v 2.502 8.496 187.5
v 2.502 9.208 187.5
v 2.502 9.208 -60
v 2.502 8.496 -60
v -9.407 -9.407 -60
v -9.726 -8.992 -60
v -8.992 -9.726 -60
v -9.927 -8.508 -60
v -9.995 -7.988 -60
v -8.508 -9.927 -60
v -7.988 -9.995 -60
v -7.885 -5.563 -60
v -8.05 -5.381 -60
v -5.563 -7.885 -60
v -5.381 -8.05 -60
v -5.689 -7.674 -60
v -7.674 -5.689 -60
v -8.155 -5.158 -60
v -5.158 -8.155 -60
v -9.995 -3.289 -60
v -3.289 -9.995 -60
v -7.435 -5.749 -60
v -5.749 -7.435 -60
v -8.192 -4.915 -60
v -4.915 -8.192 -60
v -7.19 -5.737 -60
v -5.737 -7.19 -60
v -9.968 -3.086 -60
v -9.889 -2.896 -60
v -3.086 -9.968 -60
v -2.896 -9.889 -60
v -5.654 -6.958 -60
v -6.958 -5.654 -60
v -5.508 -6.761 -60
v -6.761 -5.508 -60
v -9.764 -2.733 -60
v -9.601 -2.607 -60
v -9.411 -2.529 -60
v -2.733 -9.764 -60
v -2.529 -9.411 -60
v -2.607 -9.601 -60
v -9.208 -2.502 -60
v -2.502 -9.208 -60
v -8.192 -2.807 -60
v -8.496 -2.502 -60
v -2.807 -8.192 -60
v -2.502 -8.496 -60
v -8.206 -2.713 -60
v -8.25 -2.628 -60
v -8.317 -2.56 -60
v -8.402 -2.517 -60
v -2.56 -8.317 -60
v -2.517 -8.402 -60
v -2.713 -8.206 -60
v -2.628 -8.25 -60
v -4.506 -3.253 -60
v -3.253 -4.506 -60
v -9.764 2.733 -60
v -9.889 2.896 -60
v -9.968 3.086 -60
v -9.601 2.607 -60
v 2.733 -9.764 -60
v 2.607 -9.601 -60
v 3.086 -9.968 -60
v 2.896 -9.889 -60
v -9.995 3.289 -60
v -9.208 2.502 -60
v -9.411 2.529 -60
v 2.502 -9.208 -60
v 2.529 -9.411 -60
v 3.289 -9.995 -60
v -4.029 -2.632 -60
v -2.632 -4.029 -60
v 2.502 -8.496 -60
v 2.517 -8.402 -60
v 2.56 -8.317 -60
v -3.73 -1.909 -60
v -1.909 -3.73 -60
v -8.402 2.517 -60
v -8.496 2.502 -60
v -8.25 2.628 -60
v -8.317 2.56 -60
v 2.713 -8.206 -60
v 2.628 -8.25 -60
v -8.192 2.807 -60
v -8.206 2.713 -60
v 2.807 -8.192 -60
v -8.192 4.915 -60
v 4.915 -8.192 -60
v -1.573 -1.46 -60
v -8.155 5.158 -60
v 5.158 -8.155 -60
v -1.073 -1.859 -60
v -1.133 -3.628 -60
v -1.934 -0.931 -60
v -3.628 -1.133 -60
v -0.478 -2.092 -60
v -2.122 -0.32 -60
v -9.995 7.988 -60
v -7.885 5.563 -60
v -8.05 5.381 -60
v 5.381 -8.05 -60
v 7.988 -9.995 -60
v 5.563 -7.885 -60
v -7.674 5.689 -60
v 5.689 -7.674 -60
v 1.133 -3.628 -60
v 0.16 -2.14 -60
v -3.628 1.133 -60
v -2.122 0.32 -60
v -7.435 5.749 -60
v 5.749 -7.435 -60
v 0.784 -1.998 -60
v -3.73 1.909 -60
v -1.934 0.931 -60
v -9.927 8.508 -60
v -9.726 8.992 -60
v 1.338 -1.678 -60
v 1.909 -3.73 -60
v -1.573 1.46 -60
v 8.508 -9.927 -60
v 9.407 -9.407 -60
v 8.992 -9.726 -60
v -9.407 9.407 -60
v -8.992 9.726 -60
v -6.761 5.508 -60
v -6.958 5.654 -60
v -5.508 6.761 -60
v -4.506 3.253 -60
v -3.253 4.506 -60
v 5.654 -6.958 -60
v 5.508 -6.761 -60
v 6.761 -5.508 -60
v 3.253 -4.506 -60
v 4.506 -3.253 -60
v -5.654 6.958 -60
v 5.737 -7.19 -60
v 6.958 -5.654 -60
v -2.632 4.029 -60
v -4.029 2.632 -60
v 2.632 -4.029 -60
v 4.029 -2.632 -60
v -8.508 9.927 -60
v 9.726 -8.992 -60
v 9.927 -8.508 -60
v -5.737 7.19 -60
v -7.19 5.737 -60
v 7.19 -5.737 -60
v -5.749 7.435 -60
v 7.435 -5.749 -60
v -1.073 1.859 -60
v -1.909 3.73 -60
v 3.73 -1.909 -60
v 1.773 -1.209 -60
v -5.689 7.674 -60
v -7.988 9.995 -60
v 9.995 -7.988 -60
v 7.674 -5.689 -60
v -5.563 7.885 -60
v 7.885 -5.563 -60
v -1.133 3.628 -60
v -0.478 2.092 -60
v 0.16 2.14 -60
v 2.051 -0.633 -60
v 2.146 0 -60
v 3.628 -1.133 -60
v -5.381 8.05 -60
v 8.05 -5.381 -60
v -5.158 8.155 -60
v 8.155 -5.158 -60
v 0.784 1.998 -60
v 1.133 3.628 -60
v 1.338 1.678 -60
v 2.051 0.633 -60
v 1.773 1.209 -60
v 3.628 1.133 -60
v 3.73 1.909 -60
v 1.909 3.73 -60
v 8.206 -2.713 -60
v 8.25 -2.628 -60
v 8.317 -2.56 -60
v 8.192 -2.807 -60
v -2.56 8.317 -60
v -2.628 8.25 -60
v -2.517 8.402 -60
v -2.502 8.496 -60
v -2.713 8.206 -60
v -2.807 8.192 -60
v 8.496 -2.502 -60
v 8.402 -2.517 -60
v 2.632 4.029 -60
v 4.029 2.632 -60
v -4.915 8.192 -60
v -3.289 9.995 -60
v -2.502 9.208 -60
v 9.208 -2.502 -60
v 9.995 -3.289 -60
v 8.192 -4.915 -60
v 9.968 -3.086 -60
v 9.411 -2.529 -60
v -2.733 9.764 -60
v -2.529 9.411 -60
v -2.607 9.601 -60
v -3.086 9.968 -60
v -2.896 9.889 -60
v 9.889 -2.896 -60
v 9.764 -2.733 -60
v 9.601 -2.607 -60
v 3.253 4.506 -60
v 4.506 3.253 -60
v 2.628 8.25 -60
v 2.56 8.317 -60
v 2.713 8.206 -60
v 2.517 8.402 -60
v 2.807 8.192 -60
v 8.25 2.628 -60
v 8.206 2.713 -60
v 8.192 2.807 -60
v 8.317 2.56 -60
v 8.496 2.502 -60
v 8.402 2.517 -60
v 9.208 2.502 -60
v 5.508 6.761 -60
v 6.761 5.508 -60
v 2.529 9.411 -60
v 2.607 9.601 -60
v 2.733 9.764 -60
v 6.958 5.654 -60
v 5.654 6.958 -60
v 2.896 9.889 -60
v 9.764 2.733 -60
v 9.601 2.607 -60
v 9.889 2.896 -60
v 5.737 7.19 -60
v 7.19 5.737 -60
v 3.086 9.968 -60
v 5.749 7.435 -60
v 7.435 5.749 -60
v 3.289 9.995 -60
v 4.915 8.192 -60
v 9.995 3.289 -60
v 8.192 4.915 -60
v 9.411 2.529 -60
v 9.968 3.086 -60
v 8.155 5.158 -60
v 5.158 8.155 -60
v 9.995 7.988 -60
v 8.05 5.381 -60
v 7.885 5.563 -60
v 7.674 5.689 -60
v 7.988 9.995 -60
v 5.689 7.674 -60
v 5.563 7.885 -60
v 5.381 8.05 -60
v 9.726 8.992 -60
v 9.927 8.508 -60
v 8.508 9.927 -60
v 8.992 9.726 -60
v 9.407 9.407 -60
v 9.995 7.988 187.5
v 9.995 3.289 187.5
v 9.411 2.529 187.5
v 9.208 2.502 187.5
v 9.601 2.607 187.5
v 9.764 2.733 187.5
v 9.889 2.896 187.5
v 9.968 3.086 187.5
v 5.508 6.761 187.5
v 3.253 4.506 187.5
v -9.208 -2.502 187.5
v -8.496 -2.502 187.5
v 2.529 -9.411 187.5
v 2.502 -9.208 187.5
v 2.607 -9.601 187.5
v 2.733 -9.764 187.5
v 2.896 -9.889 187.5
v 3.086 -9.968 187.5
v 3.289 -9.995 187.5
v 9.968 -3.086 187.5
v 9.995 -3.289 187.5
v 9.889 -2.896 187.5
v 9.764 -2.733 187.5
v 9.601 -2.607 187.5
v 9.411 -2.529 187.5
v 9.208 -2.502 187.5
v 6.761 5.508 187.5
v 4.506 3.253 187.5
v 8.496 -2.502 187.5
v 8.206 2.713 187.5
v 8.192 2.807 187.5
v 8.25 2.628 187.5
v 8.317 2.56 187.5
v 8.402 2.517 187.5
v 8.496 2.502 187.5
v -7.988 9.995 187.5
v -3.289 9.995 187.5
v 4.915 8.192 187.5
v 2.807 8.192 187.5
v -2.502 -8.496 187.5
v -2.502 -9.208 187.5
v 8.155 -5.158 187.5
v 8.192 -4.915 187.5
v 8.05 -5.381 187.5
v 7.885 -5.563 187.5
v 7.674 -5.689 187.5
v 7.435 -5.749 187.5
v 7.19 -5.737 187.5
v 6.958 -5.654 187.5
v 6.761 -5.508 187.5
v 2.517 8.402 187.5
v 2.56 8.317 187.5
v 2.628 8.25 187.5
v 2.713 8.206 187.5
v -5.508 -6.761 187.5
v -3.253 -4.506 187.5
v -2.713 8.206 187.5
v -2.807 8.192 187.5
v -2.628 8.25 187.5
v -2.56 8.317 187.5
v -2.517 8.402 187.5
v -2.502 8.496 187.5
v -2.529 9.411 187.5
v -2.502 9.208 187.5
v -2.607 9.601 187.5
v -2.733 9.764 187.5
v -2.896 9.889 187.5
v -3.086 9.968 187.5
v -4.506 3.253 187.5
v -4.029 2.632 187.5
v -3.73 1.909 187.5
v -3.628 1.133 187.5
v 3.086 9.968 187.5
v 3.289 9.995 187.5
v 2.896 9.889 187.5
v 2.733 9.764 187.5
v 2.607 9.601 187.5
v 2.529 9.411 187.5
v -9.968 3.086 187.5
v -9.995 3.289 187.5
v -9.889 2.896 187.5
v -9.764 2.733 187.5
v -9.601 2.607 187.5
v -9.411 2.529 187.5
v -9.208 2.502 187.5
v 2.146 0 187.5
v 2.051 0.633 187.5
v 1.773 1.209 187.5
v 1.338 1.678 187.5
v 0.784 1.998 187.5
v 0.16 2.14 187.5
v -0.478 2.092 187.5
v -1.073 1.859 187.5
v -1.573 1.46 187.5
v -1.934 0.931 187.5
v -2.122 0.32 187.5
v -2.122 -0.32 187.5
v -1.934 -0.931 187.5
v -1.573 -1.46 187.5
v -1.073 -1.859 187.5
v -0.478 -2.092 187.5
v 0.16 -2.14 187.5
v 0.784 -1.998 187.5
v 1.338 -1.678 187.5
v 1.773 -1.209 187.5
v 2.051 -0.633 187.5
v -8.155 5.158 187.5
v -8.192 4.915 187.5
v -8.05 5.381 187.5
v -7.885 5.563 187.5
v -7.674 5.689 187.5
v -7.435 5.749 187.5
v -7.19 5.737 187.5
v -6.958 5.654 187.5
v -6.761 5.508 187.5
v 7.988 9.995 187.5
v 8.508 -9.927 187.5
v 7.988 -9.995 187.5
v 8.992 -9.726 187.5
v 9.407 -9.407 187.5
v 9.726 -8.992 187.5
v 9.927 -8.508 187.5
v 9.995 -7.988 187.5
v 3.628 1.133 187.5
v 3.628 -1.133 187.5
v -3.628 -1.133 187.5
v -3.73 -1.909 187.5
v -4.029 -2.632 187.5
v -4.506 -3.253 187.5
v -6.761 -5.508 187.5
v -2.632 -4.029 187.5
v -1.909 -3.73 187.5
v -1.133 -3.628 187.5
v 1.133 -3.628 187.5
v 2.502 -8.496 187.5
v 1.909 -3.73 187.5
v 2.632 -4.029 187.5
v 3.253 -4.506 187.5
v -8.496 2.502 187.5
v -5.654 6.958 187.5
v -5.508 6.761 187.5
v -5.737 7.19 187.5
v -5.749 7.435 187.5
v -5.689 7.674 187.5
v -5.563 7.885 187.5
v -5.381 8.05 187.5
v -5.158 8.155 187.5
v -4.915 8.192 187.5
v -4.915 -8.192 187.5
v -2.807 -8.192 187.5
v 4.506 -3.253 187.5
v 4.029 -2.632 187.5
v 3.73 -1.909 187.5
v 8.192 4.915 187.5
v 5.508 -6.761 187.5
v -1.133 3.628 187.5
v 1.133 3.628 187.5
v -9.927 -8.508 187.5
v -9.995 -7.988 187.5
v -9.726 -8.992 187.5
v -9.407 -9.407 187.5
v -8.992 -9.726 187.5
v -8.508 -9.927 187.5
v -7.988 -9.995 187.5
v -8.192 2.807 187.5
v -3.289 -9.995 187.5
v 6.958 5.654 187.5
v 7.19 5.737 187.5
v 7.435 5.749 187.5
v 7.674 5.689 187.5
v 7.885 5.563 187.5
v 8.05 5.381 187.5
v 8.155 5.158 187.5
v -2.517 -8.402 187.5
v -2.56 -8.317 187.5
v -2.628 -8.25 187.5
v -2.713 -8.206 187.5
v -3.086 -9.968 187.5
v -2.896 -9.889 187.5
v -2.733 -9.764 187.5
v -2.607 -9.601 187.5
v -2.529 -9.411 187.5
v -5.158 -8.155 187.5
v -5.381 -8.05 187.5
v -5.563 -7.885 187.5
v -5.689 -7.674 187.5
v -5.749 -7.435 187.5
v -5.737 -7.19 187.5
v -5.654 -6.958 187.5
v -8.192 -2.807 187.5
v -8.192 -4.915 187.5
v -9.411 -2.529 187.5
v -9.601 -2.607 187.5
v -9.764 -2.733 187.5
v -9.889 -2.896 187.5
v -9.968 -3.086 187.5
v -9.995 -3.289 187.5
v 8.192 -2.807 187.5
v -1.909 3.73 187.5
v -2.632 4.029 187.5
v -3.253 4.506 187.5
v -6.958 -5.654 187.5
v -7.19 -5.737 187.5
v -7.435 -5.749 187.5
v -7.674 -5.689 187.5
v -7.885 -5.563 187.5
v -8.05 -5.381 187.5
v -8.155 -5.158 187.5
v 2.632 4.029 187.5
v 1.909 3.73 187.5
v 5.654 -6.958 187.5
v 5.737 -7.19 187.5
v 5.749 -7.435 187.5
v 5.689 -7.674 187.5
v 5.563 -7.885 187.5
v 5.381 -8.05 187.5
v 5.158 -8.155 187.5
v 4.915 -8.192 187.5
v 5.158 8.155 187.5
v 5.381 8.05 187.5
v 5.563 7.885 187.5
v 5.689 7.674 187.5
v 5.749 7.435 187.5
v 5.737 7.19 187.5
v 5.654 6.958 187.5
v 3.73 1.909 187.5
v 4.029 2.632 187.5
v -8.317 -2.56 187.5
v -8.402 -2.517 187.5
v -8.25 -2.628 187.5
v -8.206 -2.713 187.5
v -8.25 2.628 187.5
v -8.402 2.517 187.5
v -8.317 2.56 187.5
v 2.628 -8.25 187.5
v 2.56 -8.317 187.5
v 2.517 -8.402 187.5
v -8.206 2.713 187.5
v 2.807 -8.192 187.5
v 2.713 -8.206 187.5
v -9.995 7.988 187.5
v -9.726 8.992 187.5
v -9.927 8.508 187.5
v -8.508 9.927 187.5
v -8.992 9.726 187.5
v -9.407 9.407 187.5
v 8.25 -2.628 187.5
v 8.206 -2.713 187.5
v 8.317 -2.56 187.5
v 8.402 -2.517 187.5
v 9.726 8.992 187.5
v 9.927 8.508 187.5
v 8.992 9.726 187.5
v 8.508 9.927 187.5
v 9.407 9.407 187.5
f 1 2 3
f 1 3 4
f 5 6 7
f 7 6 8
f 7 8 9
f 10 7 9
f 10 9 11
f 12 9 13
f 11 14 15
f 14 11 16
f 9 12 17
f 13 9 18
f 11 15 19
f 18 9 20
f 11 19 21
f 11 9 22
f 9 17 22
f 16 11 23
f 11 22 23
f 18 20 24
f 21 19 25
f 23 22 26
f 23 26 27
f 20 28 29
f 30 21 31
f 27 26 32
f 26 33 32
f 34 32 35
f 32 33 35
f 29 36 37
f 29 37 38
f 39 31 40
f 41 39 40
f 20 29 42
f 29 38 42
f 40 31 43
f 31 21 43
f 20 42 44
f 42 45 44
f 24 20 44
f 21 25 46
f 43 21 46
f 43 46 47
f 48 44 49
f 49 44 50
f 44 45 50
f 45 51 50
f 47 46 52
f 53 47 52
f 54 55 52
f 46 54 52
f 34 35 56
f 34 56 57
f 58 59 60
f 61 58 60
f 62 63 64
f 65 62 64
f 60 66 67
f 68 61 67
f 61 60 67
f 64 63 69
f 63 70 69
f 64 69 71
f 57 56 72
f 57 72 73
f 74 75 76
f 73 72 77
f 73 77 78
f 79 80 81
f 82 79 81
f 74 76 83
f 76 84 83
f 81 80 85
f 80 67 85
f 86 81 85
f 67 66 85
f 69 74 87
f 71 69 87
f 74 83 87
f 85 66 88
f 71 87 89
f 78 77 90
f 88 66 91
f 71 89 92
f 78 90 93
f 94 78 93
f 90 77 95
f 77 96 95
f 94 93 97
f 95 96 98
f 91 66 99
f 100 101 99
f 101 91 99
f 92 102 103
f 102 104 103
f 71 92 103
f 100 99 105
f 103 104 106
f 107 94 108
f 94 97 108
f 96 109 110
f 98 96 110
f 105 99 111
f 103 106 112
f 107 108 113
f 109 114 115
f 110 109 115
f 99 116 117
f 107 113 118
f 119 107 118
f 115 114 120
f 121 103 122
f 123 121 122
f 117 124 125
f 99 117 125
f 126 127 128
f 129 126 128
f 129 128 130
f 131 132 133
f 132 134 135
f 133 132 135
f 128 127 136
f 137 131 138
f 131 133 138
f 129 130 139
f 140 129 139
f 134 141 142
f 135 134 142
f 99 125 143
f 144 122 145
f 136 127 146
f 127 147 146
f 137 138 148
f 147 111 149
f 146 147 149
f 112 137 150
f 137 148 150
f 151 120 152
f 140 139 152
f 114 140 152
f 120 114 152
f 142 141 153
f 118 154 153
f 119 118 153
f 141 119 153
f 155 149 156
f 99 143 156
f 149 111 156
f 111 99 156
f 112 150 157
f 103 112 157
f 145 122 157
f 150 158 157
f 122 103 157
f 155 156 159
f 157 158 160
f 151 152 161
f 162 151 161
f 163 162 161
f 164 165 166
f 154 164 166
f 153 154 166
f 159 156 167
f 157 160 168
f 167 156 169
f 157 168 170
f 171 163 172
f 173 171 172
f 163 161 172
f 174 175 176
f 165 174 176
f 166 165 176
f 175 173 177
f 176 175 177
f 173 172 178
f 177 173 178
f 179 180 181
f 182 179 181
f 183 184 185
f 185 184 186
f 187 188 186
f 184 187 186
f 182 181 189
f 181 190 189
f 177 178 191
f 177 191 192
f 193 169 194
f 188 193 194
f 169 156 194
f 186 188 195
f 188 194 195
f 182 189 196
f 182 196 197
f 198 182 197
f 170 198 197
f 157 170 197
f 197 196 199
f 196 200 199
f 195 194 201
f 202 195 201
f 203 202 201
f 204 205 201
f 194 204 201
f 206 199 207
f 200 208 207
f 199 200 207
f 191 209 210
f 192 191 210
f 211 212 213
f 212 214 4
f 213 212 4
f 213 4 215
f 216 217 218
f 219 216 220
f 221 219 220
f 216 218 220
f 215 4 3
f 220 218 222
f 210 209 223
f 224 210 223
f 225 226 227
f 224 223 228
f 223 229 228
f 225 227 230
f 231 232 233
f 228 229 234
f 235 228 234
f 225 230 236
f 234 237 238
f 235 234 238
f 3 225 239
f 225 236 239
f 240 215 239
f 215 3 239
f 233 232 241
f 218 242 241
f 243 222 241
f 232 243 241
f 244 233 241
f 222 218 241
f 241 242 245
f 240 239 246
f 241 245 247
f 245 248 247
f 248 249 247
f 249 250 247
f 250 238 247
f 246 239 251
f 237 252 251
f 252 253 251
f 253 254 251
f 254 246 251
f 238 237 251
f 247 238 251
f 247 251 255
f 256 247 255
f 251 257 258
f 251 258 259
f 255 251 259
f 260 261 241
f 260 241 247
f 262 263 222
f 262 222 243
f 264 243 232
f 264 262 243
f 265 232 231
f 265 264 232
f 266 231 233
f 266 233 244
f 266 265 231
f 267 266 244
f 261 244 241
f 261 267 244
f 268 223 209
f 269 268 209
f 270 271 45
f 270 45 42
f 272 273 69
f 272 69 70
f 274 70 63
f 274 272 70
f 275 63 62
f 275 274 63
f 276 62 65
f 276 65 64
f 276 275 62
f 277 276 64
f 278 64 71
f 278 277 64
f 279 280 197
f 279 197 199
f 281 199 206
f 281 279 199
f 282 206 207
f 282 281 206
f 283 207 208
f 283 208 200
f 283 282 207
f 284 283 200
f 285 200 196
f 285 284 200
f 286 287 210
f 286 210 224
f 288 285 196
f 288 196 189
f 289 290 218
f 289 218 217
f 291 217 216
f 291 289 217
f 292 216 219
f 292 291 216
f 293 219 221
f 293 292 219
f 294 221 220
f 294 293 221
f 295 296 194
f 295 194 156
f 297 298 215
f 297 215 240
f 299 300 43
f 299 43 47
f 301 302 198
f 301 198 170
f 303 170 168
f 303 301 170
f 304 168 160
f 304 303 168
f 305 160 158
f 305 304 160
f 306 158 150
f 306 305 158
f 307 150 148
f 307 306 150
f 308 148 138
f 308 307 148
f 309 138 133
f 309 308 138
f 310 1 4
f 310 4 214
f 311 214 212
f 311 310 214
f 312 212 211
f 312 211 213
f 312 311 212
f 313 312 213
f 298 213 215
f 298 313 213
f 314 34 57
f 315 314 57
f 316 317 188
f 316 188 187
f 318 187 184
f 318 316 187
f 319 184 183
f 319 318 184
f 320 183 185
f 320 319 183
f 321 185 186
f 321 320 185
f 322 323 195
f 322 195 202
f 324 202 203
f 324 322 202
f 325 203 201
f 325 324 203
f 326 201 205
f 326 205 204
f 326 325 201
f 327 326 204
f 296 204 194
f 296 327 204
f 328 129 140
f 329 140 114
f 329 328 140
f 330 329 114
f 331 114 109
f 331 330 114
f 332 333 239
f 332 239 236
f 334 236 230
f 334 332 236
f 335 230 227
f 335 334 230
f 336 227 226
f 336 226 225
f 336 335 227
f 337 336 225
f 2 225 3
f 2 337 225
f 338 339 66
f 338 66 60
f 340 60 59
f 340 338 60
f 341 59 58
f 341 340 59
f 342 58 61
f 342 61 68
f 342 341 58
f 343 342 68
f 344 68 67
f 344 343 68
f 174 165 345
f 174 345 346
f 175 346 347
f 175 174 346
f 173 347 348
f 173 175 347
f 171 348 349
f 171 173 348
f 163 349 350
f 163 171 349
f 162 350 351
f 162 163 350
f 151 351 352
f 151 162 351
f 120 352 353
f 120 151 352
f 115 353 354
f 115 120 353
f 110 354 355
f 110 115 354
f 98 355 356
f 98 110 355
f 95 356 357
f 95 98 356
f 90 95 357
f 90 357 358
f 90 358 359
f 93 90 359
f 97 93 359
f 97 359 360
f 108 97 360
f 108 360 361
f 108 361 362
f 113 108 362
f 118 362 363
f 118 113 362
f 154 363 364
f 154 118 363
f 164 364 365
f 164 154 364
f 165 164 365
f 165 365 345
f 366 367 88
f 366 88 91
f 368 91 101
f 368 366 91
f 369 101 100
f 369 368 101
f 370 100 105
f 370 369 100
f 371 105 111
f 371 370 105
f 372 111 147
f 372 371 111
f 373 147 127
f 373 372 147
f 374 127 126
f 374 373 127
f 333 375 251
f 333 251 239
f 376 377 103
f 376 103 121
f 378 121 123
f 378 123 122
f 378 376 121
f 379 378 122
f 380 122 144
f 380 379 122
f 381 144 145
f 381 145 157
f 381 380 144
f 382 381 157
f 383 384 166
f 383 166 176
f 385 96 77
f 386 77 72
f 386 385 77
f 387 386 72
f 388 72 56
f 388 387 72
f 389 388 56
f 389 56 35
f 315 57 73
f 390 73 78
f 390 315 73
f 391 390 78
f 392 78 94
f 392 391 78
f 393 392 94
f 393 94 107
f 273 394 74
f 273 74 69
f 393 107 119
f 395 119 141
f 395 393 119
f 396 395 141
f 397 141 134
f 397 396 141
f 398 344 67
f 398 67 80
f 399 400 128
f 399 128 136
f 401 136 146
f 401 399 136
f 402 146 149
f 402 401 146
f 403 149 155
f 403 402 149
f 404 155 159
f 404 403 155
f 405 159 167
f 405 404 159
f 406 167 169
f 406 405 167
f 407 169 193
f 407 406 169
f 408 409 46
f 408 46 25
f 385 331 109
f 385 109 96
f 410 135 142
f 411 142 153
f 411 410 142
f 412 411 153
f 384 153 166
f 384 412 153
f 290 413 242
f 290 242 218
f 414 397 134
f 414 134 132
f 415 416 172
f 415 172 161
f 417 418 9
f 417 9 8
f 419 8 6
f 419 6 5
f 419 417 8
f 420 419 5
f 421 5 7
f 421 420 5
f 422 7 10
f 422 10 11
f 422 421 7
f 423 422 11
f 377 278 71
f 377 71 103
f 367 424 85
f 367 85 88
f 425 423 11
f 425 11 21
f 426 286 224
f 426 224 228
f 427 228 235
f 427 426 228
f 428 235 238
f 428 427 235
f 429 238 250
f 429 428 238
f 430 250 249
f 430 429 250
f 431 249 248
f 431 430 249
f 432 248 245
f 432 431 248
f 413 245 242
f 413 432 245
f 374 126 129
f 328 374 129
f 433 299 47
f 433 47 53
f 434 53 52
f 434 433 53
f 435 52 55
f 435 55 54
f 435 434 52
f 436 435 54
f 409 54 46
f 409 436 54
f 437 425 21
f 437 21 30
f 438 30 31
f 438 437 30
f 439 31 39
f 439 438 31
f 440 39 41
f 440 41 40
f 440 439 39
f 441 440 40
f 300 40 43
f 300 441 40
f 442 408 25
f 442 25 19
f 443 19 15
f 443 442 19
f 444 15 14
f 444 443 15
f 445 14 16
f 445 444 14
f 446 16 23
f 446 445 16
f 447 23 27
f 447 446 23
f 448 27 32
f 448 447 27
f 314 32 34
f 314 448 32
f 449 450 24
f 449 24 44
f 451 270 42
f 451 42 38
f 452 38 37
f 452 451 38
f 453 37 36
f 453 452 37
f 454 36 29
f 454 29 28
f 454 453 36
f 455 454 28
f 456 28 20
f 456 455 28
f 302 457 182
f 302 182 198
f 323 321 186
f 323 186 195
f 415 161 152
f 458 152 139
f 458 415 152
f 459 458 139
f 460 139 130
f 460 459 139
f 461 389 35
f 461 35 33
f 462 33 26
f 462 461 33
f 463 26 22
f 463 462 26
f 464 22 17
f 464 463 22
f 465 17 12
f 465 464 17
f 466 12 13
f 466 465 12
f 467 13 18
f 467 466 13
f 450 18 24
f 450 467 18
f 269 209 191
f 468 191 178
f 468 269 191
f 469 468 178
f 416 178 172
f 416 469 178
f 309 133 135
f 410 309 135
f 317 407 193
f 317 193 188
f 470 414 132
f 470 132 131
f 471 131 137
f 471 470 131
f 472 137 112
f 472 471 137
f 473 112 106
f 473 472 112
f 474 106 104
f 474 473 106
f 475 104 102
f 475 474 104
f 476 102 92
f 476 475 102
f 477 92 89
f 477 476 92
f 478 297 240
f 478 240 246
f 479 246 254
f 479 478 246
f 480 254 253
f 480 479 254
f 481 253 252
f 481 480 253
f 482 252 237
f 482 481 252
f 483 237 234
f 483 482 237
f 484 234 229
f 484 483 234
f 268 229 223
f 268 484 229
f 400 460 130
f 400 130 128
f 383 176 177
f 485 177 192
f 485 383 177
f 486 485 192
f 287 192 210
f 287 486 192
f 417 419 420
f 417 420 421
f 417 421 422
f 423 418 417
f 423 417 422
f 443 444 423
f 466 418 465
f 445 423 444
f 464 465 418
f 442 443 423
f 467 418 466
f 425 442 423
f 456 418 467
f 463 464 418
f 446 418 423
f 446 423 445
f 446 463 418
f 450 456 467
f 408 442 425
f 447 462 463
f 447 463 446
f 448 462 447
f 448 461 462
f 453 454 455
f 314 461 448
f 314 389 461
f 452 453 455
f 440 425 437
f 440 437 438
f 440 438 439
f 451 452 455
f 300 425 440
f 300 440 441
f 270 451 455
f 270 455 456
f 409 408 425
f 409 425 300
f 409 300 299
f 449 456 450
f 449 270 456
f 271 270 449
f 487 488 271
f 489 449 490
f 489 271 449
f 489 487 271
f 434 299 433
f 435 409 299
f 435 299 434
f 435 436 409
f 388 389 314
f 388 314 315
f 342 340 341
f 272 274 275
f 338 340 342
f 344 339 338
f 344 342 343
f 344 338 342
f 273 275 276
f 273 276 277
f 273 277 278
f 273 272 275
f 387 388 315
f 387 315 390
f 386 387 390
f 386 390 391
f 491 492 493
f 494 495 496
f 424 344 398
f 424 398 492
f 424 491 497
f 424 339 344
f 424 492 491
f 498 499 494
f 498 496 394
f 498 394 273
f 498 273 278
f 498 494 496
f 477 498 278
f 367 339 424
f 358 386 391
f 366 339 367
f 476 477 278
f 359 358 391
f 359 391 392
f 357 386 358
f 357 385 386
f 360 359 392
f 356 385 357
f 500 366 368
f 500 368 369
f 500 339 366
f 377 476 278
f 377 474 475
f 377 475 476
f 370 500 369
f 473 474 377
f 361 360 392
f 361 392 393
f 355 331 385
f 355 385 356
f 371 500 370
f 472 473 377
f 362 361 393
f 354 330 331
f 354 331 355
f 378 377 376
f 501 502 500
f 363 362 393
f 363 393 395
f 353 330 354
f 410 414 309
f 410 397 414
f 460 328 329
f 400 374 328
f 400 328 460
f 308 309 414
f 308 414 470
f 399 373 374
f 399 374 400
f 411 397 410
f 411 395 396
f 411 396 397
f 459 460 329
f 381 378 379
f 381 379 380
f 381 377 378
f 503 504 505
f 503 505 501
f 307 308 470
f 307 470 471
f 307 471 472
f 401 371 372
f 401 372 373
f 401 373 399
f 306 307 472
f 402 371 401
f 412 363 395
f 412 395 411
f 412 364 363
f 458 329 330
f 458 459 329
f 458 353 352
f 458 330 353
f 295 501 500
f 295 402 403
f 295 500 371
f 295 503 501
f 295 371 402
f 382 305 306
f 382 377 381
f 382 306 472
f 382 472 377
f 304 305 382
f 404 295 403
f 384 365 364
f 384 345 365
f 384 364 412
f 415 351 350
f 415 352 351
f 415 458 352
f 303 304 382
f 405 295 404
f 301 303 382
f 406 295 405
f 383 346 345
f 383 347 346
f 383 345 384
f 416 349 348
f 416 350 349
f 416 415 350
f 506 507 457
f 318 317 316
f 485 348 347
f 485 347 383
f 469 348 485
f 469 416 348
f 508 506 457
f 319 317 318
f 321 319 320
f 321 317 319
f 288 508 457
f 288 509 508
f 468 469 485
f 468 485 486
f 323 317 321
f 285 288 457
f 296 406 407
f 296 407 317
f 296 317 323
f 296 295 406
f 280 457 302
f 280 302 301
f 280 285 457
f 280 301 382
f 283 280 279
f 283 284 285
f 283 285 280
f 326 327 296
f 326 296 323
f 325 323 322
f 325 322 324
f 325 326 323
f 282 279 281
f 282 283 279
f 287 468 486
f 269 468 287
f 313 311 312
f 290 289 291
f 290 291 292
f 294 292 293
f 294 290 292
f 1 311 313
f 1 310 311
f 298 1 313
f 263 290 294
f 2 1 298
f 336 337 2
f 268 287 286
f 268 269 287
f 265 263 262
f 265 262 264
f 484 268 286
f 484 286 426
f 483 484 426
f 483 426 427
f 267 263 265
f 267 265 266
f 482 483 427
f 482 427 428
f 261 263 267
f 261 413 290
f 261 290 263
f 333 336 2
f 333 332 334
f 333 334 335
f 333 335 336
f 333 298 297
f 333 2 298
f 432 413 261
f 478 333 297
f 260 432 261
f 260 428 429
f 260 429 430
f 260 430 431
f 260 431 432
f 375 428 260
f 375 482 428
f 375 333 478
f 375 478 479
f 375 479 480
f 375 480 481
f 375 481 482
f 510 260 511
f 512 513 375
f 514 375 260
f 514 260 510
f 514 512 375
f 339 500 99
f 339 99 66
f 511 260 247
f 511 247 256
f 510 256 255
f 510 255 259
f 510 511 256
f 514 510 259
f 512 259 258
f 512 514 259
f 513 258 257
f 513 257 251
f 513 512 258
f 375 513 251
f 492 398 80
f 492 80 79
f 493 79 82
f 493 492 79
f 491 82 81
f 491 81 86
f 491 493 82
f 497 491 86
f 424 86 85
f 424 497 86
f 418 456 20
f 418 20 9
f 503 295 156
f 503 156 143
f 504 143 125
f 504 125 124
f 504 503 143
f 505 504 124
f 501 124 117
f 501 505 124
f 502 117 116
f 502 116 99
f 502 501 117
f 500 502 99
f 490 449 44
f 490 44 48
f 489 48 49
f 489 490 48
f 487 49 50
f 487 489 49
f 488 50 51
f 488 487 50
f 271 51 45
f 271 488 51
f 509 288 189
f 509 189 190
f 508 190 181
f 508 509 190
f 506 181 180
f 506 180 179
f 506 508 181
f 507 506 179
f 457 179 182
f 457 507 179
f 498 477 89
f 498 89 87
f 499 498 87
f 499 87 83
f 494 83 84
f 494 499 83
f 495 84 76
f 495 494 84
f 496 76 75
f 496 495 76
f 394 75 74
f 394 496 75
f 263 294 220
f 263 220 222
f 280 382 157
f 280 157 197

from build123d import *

# Parameters (mm, degrees)
SKETCH1_R           = 2.1463
BOSS_EXTRUDE1_DEPTH = 187.5
SKETCH2_W           = 61.526977309
SKETCH2_H           = 152.756633319
CUT_EXTRUDE1_DEPTH  = 20.9898


with BuildPart() as part:
    # Sketch1 → Boss-Extrude1 (new body, symmetric)
    with BuildSketch(Plane.XY):
        with BuildLine():
            Line((-9.9949, 7.9883), (-9.9949, 3.2893))
            ThreePointArc((-9.9949, 3.2893), (-9.76427588, 2.73252412), (-9.2075, 2.5019))
            Line((-9.2075, 2.5019), (-8.4963, 2.5019))
            ThreePointArc((-8.4963, 2.5019), (-8.280773853, 2.591173853), (-8.1915, 2.8067))
            Line((-8.1915, 2.8067), (-8.1915, 4.9149))
            ThreePointArc((-8.1915, 4.9149), (-7.674065253, 5.689295824), (-6.760603096, 5.507596904))
            Line((-6.760603096, 5.507596904), (-4.505765747, 3.252759555))
            ThreePointArc((-4.505765747, 3.252759555), (-3.856054457, 2.280397894), (-3.627906192, 1.133419111))
            Line((-3.627906192, 1.133419111), (-3.627906192, -1.133419111))
            ThreePointArc((-3.627906192, -1.133419111), (-3.856054457, -2.280397894), (-4.505765747, -3.252759555))
            Line((-4.505765747, -3.252759555), (-6.760603096, -5.507596904))
            ThreePointArc((-6.760603096, -5.507596904), (-7.674065253, -5.689295824), (-8.1915, -4.9149))
            Line((-8.1915, -4.9149), (-8.1915, -2.8067))
            ThreePointArc((-8.1915, -2.8067), (-8.280773853, -2.591173853), (-8.4963, -2.5019))
            Line((-8.4963, -2.5019), (-9.2075, -2.5019))
            ThreePointArc((-9.2075, -2.5019), (-9.76427588, -2.73252412), (-9.9949, -3.2893))
            Line((-9.9949, -3.2893), (-9.9949, -7.9883))
            ThreePointArc((-9.9949, -7.9883), (-9.407180467, -9.407180467), (-7.9883, -9.9949))
            Line((-7.9883, -9.9949), (-3.2893, -9.9949))
            ThreePointArc((-3.2893, -9.9949), (-2.73252412, -9.76427588), (-2.5019, -9.2075))
            Line((-2.5019, -9.2075), (-2.5019, -8.4963))
            ThreePointArc((-2.5019, -8.4963), (-2.591173853, -8.280773853), (-2.8067, -8.1915))
            Line((-2.8067, -8.1915), (-4.9149, -8.1915))
            ThreePointArc((-4.9149, -8.1915), (-5.689295824, -7.674065253), (-5.507596904, -6.760603096))
            Line((-5.507596904, -6.760603096), (-3.252759555, -4.505765747))
            ThreePointArc((-3.252759555, -4.505765747), (-2.280397894, -3.856054457), (-1.133419111, -3.627906192))
            Line((-1.133419111, -3.627906192), (1.133419111, -3.627906192))
            ThreePointArc((1.133419111, -3.627906192), (2.280397894, -3.856054457), (3.252759555, -4.505765747))
            Line((3.252759555, -4.505765747), (5.507596904, -6.760603096))
            ThreePointArc((5.507596904, -6.760603096), (5.689295824, -7.674065253), (4.9149, -8.1915))
            Line((4.9149, -8.1915), (2.8067, -8.1915))
            ThreePointArc((2.8067, -8.1915), (2.591173853, -8.280773853), (2.5019, -8.4963))
            Line((2.5019, -8.4963), (2.5019, -9.2075))
            ThreePointArc((2.5019, -9.2075), (2.73252412, -9.76427588), (3.2893, -9.9949))
            Line((3.2893, -9.9949), (7.9883, -9.9949))
            ThreePointArc((7.9883, -9.9949), (9.407180467, -9.407180467), (9.9949, -7.9883))
            Line((9.9949, -7.9883), (9.9949, -3.2893))
            ThreePointArc((9.9949, -3.2893), (9.76427588, -2.73252412), (9.2075, -2.5019))
            Line((9.2075, -2.5019), (8.4963, -2.5019))
            ThreePointArc((8.4963, -2.5019), (8.280773853, -2.591173853), (8.1915, -2.8067))
            Line((8.1915, -2.8067), (8.1915, -4.9149))
            ThreePointArc((8.1915, -4.9149), (7.674065253, -5.689295824), (6.760603096, -5.507596904))
            Line((6.760603096, -5.507596904), (4.505765747, -3.252759555))
            ThreePointArc((4.505765747, -3.252759555), (3.856054457, -2.280397894), (3.627906192, -1.133419111))
            Line((3.627906192, -1.133419111), (3.627906192, 1.133419111))
            ThreePointArc((3.627906192, 1.133419111), (3.856054457, 2.280397894), (4.505765747, 3.252759555))
            Line((4.505765747, 3.252759555), (6.760603096, 5.507596904))
            ThreePointArc((6.760603096, 5.507596904), (7.674065253, 5.689295824), (8.1915, 4.9149))
            Line((8.1915, 4.9149), (8.1915, 2.8067))
            ThreePointArc((8.1915, 2.8067), (8.280773853, 2.591173853), (8.4963, 2.5019))
            Line((8.4963, 2.5019), (9.2075, 2.5019))
            ThreePointArc((9.2075, 2.5019), (9.76427588, 2.73252412), (9.9949, 3.2893))
            Line((9.9949, 3.2893), (9.9949, 7.9883))
            ThreePointArc((9.9949, 7.9883), (9.407180467, 9.407180467), (7.9883, 9.9949))
            Line((7.9883, 9.9949), (3.2893, 9.9949))
            ThreePointArc((3.2893, 9.9949), (2.73252412, 9.76427588), (2.5019, 9.2075))
            Line((2.5019, 9.2075), (2.5019, 8.4963))
            ThreePointArc((2.5019, 8.4963), (2.591173853, 8.280773853), (2.8067, 8.1915))
            Line((2.8067, 8.1915), (4.9149, 8.1915))
            ThreePointArc((4.9149, 8.1915), (5.689295824, 7.674065253), (5.507596904, 6.760603096))
            Line((5.507596904, 6.760603096), (3.252759555, 4.505765747))
            ThreePointArc((3.252759555, 4.505765747), (2.280397894, 3.856054457), (1.133419111, 3.627906192))
            Line((1.133419111, 3.627906192), (-1.133419111, 3.627906192))
            ThreePointArc((-1.133419111, 3.627906192), (-2.280397894, 3.856054457), (-3.252759555, 4.505765747))
            Line((-3.252759555, 4.505765747), (-5.507596904, 6.760603096))
            ThreePointArc((-5.507596904, 6.760603096), (-5.689295824, 7.674065253), (-4.9149, 8.1915))
            Line((-4.9149, 8.1915), (-2.8067, 8.1915))
            ThreePointArc((-2.8067, 8.1915), (-2.591173853, 8.280773853), (-2.5019, 8.4963))
            Line((-2.5019, 8.4963), (-2.5019, 9.2075))
            ThreePointArc((-2.5019, 9.2075), (-2.73252412, 9.76427588), (-3.2893, 9.9949))
            Line((-3.2893, 9.9949), (-7.9883, 9.9949))
            ThreePointArc((-7.9883, 9.9949), (-9.407180467, 9.407180467), (-9.9949, 7.9883))
        make_face()
        Circle(SKETCH1_R, mode=Mode.SUBTRACT)
    extrude(amount=BOSS_EXTRUDE1_DEPTH, both=True)

    # Sketch2 → Cut-Extrude1 (cut, through all)
    with BuildSketch(Plane(origin=(0, 9.9949, 0), x_dir=(1, 0, 0), z_dir=(0, 1, 0))):
        with Locations((5.480851427, 136.37831666)):
            Rectangle(SKETCH2_W, SKETCH2_H)
    extrude(amount=-CUT_EXTRUDE1_DEPTH, mode=Mode.SUBTRACT)


solid = part.part
